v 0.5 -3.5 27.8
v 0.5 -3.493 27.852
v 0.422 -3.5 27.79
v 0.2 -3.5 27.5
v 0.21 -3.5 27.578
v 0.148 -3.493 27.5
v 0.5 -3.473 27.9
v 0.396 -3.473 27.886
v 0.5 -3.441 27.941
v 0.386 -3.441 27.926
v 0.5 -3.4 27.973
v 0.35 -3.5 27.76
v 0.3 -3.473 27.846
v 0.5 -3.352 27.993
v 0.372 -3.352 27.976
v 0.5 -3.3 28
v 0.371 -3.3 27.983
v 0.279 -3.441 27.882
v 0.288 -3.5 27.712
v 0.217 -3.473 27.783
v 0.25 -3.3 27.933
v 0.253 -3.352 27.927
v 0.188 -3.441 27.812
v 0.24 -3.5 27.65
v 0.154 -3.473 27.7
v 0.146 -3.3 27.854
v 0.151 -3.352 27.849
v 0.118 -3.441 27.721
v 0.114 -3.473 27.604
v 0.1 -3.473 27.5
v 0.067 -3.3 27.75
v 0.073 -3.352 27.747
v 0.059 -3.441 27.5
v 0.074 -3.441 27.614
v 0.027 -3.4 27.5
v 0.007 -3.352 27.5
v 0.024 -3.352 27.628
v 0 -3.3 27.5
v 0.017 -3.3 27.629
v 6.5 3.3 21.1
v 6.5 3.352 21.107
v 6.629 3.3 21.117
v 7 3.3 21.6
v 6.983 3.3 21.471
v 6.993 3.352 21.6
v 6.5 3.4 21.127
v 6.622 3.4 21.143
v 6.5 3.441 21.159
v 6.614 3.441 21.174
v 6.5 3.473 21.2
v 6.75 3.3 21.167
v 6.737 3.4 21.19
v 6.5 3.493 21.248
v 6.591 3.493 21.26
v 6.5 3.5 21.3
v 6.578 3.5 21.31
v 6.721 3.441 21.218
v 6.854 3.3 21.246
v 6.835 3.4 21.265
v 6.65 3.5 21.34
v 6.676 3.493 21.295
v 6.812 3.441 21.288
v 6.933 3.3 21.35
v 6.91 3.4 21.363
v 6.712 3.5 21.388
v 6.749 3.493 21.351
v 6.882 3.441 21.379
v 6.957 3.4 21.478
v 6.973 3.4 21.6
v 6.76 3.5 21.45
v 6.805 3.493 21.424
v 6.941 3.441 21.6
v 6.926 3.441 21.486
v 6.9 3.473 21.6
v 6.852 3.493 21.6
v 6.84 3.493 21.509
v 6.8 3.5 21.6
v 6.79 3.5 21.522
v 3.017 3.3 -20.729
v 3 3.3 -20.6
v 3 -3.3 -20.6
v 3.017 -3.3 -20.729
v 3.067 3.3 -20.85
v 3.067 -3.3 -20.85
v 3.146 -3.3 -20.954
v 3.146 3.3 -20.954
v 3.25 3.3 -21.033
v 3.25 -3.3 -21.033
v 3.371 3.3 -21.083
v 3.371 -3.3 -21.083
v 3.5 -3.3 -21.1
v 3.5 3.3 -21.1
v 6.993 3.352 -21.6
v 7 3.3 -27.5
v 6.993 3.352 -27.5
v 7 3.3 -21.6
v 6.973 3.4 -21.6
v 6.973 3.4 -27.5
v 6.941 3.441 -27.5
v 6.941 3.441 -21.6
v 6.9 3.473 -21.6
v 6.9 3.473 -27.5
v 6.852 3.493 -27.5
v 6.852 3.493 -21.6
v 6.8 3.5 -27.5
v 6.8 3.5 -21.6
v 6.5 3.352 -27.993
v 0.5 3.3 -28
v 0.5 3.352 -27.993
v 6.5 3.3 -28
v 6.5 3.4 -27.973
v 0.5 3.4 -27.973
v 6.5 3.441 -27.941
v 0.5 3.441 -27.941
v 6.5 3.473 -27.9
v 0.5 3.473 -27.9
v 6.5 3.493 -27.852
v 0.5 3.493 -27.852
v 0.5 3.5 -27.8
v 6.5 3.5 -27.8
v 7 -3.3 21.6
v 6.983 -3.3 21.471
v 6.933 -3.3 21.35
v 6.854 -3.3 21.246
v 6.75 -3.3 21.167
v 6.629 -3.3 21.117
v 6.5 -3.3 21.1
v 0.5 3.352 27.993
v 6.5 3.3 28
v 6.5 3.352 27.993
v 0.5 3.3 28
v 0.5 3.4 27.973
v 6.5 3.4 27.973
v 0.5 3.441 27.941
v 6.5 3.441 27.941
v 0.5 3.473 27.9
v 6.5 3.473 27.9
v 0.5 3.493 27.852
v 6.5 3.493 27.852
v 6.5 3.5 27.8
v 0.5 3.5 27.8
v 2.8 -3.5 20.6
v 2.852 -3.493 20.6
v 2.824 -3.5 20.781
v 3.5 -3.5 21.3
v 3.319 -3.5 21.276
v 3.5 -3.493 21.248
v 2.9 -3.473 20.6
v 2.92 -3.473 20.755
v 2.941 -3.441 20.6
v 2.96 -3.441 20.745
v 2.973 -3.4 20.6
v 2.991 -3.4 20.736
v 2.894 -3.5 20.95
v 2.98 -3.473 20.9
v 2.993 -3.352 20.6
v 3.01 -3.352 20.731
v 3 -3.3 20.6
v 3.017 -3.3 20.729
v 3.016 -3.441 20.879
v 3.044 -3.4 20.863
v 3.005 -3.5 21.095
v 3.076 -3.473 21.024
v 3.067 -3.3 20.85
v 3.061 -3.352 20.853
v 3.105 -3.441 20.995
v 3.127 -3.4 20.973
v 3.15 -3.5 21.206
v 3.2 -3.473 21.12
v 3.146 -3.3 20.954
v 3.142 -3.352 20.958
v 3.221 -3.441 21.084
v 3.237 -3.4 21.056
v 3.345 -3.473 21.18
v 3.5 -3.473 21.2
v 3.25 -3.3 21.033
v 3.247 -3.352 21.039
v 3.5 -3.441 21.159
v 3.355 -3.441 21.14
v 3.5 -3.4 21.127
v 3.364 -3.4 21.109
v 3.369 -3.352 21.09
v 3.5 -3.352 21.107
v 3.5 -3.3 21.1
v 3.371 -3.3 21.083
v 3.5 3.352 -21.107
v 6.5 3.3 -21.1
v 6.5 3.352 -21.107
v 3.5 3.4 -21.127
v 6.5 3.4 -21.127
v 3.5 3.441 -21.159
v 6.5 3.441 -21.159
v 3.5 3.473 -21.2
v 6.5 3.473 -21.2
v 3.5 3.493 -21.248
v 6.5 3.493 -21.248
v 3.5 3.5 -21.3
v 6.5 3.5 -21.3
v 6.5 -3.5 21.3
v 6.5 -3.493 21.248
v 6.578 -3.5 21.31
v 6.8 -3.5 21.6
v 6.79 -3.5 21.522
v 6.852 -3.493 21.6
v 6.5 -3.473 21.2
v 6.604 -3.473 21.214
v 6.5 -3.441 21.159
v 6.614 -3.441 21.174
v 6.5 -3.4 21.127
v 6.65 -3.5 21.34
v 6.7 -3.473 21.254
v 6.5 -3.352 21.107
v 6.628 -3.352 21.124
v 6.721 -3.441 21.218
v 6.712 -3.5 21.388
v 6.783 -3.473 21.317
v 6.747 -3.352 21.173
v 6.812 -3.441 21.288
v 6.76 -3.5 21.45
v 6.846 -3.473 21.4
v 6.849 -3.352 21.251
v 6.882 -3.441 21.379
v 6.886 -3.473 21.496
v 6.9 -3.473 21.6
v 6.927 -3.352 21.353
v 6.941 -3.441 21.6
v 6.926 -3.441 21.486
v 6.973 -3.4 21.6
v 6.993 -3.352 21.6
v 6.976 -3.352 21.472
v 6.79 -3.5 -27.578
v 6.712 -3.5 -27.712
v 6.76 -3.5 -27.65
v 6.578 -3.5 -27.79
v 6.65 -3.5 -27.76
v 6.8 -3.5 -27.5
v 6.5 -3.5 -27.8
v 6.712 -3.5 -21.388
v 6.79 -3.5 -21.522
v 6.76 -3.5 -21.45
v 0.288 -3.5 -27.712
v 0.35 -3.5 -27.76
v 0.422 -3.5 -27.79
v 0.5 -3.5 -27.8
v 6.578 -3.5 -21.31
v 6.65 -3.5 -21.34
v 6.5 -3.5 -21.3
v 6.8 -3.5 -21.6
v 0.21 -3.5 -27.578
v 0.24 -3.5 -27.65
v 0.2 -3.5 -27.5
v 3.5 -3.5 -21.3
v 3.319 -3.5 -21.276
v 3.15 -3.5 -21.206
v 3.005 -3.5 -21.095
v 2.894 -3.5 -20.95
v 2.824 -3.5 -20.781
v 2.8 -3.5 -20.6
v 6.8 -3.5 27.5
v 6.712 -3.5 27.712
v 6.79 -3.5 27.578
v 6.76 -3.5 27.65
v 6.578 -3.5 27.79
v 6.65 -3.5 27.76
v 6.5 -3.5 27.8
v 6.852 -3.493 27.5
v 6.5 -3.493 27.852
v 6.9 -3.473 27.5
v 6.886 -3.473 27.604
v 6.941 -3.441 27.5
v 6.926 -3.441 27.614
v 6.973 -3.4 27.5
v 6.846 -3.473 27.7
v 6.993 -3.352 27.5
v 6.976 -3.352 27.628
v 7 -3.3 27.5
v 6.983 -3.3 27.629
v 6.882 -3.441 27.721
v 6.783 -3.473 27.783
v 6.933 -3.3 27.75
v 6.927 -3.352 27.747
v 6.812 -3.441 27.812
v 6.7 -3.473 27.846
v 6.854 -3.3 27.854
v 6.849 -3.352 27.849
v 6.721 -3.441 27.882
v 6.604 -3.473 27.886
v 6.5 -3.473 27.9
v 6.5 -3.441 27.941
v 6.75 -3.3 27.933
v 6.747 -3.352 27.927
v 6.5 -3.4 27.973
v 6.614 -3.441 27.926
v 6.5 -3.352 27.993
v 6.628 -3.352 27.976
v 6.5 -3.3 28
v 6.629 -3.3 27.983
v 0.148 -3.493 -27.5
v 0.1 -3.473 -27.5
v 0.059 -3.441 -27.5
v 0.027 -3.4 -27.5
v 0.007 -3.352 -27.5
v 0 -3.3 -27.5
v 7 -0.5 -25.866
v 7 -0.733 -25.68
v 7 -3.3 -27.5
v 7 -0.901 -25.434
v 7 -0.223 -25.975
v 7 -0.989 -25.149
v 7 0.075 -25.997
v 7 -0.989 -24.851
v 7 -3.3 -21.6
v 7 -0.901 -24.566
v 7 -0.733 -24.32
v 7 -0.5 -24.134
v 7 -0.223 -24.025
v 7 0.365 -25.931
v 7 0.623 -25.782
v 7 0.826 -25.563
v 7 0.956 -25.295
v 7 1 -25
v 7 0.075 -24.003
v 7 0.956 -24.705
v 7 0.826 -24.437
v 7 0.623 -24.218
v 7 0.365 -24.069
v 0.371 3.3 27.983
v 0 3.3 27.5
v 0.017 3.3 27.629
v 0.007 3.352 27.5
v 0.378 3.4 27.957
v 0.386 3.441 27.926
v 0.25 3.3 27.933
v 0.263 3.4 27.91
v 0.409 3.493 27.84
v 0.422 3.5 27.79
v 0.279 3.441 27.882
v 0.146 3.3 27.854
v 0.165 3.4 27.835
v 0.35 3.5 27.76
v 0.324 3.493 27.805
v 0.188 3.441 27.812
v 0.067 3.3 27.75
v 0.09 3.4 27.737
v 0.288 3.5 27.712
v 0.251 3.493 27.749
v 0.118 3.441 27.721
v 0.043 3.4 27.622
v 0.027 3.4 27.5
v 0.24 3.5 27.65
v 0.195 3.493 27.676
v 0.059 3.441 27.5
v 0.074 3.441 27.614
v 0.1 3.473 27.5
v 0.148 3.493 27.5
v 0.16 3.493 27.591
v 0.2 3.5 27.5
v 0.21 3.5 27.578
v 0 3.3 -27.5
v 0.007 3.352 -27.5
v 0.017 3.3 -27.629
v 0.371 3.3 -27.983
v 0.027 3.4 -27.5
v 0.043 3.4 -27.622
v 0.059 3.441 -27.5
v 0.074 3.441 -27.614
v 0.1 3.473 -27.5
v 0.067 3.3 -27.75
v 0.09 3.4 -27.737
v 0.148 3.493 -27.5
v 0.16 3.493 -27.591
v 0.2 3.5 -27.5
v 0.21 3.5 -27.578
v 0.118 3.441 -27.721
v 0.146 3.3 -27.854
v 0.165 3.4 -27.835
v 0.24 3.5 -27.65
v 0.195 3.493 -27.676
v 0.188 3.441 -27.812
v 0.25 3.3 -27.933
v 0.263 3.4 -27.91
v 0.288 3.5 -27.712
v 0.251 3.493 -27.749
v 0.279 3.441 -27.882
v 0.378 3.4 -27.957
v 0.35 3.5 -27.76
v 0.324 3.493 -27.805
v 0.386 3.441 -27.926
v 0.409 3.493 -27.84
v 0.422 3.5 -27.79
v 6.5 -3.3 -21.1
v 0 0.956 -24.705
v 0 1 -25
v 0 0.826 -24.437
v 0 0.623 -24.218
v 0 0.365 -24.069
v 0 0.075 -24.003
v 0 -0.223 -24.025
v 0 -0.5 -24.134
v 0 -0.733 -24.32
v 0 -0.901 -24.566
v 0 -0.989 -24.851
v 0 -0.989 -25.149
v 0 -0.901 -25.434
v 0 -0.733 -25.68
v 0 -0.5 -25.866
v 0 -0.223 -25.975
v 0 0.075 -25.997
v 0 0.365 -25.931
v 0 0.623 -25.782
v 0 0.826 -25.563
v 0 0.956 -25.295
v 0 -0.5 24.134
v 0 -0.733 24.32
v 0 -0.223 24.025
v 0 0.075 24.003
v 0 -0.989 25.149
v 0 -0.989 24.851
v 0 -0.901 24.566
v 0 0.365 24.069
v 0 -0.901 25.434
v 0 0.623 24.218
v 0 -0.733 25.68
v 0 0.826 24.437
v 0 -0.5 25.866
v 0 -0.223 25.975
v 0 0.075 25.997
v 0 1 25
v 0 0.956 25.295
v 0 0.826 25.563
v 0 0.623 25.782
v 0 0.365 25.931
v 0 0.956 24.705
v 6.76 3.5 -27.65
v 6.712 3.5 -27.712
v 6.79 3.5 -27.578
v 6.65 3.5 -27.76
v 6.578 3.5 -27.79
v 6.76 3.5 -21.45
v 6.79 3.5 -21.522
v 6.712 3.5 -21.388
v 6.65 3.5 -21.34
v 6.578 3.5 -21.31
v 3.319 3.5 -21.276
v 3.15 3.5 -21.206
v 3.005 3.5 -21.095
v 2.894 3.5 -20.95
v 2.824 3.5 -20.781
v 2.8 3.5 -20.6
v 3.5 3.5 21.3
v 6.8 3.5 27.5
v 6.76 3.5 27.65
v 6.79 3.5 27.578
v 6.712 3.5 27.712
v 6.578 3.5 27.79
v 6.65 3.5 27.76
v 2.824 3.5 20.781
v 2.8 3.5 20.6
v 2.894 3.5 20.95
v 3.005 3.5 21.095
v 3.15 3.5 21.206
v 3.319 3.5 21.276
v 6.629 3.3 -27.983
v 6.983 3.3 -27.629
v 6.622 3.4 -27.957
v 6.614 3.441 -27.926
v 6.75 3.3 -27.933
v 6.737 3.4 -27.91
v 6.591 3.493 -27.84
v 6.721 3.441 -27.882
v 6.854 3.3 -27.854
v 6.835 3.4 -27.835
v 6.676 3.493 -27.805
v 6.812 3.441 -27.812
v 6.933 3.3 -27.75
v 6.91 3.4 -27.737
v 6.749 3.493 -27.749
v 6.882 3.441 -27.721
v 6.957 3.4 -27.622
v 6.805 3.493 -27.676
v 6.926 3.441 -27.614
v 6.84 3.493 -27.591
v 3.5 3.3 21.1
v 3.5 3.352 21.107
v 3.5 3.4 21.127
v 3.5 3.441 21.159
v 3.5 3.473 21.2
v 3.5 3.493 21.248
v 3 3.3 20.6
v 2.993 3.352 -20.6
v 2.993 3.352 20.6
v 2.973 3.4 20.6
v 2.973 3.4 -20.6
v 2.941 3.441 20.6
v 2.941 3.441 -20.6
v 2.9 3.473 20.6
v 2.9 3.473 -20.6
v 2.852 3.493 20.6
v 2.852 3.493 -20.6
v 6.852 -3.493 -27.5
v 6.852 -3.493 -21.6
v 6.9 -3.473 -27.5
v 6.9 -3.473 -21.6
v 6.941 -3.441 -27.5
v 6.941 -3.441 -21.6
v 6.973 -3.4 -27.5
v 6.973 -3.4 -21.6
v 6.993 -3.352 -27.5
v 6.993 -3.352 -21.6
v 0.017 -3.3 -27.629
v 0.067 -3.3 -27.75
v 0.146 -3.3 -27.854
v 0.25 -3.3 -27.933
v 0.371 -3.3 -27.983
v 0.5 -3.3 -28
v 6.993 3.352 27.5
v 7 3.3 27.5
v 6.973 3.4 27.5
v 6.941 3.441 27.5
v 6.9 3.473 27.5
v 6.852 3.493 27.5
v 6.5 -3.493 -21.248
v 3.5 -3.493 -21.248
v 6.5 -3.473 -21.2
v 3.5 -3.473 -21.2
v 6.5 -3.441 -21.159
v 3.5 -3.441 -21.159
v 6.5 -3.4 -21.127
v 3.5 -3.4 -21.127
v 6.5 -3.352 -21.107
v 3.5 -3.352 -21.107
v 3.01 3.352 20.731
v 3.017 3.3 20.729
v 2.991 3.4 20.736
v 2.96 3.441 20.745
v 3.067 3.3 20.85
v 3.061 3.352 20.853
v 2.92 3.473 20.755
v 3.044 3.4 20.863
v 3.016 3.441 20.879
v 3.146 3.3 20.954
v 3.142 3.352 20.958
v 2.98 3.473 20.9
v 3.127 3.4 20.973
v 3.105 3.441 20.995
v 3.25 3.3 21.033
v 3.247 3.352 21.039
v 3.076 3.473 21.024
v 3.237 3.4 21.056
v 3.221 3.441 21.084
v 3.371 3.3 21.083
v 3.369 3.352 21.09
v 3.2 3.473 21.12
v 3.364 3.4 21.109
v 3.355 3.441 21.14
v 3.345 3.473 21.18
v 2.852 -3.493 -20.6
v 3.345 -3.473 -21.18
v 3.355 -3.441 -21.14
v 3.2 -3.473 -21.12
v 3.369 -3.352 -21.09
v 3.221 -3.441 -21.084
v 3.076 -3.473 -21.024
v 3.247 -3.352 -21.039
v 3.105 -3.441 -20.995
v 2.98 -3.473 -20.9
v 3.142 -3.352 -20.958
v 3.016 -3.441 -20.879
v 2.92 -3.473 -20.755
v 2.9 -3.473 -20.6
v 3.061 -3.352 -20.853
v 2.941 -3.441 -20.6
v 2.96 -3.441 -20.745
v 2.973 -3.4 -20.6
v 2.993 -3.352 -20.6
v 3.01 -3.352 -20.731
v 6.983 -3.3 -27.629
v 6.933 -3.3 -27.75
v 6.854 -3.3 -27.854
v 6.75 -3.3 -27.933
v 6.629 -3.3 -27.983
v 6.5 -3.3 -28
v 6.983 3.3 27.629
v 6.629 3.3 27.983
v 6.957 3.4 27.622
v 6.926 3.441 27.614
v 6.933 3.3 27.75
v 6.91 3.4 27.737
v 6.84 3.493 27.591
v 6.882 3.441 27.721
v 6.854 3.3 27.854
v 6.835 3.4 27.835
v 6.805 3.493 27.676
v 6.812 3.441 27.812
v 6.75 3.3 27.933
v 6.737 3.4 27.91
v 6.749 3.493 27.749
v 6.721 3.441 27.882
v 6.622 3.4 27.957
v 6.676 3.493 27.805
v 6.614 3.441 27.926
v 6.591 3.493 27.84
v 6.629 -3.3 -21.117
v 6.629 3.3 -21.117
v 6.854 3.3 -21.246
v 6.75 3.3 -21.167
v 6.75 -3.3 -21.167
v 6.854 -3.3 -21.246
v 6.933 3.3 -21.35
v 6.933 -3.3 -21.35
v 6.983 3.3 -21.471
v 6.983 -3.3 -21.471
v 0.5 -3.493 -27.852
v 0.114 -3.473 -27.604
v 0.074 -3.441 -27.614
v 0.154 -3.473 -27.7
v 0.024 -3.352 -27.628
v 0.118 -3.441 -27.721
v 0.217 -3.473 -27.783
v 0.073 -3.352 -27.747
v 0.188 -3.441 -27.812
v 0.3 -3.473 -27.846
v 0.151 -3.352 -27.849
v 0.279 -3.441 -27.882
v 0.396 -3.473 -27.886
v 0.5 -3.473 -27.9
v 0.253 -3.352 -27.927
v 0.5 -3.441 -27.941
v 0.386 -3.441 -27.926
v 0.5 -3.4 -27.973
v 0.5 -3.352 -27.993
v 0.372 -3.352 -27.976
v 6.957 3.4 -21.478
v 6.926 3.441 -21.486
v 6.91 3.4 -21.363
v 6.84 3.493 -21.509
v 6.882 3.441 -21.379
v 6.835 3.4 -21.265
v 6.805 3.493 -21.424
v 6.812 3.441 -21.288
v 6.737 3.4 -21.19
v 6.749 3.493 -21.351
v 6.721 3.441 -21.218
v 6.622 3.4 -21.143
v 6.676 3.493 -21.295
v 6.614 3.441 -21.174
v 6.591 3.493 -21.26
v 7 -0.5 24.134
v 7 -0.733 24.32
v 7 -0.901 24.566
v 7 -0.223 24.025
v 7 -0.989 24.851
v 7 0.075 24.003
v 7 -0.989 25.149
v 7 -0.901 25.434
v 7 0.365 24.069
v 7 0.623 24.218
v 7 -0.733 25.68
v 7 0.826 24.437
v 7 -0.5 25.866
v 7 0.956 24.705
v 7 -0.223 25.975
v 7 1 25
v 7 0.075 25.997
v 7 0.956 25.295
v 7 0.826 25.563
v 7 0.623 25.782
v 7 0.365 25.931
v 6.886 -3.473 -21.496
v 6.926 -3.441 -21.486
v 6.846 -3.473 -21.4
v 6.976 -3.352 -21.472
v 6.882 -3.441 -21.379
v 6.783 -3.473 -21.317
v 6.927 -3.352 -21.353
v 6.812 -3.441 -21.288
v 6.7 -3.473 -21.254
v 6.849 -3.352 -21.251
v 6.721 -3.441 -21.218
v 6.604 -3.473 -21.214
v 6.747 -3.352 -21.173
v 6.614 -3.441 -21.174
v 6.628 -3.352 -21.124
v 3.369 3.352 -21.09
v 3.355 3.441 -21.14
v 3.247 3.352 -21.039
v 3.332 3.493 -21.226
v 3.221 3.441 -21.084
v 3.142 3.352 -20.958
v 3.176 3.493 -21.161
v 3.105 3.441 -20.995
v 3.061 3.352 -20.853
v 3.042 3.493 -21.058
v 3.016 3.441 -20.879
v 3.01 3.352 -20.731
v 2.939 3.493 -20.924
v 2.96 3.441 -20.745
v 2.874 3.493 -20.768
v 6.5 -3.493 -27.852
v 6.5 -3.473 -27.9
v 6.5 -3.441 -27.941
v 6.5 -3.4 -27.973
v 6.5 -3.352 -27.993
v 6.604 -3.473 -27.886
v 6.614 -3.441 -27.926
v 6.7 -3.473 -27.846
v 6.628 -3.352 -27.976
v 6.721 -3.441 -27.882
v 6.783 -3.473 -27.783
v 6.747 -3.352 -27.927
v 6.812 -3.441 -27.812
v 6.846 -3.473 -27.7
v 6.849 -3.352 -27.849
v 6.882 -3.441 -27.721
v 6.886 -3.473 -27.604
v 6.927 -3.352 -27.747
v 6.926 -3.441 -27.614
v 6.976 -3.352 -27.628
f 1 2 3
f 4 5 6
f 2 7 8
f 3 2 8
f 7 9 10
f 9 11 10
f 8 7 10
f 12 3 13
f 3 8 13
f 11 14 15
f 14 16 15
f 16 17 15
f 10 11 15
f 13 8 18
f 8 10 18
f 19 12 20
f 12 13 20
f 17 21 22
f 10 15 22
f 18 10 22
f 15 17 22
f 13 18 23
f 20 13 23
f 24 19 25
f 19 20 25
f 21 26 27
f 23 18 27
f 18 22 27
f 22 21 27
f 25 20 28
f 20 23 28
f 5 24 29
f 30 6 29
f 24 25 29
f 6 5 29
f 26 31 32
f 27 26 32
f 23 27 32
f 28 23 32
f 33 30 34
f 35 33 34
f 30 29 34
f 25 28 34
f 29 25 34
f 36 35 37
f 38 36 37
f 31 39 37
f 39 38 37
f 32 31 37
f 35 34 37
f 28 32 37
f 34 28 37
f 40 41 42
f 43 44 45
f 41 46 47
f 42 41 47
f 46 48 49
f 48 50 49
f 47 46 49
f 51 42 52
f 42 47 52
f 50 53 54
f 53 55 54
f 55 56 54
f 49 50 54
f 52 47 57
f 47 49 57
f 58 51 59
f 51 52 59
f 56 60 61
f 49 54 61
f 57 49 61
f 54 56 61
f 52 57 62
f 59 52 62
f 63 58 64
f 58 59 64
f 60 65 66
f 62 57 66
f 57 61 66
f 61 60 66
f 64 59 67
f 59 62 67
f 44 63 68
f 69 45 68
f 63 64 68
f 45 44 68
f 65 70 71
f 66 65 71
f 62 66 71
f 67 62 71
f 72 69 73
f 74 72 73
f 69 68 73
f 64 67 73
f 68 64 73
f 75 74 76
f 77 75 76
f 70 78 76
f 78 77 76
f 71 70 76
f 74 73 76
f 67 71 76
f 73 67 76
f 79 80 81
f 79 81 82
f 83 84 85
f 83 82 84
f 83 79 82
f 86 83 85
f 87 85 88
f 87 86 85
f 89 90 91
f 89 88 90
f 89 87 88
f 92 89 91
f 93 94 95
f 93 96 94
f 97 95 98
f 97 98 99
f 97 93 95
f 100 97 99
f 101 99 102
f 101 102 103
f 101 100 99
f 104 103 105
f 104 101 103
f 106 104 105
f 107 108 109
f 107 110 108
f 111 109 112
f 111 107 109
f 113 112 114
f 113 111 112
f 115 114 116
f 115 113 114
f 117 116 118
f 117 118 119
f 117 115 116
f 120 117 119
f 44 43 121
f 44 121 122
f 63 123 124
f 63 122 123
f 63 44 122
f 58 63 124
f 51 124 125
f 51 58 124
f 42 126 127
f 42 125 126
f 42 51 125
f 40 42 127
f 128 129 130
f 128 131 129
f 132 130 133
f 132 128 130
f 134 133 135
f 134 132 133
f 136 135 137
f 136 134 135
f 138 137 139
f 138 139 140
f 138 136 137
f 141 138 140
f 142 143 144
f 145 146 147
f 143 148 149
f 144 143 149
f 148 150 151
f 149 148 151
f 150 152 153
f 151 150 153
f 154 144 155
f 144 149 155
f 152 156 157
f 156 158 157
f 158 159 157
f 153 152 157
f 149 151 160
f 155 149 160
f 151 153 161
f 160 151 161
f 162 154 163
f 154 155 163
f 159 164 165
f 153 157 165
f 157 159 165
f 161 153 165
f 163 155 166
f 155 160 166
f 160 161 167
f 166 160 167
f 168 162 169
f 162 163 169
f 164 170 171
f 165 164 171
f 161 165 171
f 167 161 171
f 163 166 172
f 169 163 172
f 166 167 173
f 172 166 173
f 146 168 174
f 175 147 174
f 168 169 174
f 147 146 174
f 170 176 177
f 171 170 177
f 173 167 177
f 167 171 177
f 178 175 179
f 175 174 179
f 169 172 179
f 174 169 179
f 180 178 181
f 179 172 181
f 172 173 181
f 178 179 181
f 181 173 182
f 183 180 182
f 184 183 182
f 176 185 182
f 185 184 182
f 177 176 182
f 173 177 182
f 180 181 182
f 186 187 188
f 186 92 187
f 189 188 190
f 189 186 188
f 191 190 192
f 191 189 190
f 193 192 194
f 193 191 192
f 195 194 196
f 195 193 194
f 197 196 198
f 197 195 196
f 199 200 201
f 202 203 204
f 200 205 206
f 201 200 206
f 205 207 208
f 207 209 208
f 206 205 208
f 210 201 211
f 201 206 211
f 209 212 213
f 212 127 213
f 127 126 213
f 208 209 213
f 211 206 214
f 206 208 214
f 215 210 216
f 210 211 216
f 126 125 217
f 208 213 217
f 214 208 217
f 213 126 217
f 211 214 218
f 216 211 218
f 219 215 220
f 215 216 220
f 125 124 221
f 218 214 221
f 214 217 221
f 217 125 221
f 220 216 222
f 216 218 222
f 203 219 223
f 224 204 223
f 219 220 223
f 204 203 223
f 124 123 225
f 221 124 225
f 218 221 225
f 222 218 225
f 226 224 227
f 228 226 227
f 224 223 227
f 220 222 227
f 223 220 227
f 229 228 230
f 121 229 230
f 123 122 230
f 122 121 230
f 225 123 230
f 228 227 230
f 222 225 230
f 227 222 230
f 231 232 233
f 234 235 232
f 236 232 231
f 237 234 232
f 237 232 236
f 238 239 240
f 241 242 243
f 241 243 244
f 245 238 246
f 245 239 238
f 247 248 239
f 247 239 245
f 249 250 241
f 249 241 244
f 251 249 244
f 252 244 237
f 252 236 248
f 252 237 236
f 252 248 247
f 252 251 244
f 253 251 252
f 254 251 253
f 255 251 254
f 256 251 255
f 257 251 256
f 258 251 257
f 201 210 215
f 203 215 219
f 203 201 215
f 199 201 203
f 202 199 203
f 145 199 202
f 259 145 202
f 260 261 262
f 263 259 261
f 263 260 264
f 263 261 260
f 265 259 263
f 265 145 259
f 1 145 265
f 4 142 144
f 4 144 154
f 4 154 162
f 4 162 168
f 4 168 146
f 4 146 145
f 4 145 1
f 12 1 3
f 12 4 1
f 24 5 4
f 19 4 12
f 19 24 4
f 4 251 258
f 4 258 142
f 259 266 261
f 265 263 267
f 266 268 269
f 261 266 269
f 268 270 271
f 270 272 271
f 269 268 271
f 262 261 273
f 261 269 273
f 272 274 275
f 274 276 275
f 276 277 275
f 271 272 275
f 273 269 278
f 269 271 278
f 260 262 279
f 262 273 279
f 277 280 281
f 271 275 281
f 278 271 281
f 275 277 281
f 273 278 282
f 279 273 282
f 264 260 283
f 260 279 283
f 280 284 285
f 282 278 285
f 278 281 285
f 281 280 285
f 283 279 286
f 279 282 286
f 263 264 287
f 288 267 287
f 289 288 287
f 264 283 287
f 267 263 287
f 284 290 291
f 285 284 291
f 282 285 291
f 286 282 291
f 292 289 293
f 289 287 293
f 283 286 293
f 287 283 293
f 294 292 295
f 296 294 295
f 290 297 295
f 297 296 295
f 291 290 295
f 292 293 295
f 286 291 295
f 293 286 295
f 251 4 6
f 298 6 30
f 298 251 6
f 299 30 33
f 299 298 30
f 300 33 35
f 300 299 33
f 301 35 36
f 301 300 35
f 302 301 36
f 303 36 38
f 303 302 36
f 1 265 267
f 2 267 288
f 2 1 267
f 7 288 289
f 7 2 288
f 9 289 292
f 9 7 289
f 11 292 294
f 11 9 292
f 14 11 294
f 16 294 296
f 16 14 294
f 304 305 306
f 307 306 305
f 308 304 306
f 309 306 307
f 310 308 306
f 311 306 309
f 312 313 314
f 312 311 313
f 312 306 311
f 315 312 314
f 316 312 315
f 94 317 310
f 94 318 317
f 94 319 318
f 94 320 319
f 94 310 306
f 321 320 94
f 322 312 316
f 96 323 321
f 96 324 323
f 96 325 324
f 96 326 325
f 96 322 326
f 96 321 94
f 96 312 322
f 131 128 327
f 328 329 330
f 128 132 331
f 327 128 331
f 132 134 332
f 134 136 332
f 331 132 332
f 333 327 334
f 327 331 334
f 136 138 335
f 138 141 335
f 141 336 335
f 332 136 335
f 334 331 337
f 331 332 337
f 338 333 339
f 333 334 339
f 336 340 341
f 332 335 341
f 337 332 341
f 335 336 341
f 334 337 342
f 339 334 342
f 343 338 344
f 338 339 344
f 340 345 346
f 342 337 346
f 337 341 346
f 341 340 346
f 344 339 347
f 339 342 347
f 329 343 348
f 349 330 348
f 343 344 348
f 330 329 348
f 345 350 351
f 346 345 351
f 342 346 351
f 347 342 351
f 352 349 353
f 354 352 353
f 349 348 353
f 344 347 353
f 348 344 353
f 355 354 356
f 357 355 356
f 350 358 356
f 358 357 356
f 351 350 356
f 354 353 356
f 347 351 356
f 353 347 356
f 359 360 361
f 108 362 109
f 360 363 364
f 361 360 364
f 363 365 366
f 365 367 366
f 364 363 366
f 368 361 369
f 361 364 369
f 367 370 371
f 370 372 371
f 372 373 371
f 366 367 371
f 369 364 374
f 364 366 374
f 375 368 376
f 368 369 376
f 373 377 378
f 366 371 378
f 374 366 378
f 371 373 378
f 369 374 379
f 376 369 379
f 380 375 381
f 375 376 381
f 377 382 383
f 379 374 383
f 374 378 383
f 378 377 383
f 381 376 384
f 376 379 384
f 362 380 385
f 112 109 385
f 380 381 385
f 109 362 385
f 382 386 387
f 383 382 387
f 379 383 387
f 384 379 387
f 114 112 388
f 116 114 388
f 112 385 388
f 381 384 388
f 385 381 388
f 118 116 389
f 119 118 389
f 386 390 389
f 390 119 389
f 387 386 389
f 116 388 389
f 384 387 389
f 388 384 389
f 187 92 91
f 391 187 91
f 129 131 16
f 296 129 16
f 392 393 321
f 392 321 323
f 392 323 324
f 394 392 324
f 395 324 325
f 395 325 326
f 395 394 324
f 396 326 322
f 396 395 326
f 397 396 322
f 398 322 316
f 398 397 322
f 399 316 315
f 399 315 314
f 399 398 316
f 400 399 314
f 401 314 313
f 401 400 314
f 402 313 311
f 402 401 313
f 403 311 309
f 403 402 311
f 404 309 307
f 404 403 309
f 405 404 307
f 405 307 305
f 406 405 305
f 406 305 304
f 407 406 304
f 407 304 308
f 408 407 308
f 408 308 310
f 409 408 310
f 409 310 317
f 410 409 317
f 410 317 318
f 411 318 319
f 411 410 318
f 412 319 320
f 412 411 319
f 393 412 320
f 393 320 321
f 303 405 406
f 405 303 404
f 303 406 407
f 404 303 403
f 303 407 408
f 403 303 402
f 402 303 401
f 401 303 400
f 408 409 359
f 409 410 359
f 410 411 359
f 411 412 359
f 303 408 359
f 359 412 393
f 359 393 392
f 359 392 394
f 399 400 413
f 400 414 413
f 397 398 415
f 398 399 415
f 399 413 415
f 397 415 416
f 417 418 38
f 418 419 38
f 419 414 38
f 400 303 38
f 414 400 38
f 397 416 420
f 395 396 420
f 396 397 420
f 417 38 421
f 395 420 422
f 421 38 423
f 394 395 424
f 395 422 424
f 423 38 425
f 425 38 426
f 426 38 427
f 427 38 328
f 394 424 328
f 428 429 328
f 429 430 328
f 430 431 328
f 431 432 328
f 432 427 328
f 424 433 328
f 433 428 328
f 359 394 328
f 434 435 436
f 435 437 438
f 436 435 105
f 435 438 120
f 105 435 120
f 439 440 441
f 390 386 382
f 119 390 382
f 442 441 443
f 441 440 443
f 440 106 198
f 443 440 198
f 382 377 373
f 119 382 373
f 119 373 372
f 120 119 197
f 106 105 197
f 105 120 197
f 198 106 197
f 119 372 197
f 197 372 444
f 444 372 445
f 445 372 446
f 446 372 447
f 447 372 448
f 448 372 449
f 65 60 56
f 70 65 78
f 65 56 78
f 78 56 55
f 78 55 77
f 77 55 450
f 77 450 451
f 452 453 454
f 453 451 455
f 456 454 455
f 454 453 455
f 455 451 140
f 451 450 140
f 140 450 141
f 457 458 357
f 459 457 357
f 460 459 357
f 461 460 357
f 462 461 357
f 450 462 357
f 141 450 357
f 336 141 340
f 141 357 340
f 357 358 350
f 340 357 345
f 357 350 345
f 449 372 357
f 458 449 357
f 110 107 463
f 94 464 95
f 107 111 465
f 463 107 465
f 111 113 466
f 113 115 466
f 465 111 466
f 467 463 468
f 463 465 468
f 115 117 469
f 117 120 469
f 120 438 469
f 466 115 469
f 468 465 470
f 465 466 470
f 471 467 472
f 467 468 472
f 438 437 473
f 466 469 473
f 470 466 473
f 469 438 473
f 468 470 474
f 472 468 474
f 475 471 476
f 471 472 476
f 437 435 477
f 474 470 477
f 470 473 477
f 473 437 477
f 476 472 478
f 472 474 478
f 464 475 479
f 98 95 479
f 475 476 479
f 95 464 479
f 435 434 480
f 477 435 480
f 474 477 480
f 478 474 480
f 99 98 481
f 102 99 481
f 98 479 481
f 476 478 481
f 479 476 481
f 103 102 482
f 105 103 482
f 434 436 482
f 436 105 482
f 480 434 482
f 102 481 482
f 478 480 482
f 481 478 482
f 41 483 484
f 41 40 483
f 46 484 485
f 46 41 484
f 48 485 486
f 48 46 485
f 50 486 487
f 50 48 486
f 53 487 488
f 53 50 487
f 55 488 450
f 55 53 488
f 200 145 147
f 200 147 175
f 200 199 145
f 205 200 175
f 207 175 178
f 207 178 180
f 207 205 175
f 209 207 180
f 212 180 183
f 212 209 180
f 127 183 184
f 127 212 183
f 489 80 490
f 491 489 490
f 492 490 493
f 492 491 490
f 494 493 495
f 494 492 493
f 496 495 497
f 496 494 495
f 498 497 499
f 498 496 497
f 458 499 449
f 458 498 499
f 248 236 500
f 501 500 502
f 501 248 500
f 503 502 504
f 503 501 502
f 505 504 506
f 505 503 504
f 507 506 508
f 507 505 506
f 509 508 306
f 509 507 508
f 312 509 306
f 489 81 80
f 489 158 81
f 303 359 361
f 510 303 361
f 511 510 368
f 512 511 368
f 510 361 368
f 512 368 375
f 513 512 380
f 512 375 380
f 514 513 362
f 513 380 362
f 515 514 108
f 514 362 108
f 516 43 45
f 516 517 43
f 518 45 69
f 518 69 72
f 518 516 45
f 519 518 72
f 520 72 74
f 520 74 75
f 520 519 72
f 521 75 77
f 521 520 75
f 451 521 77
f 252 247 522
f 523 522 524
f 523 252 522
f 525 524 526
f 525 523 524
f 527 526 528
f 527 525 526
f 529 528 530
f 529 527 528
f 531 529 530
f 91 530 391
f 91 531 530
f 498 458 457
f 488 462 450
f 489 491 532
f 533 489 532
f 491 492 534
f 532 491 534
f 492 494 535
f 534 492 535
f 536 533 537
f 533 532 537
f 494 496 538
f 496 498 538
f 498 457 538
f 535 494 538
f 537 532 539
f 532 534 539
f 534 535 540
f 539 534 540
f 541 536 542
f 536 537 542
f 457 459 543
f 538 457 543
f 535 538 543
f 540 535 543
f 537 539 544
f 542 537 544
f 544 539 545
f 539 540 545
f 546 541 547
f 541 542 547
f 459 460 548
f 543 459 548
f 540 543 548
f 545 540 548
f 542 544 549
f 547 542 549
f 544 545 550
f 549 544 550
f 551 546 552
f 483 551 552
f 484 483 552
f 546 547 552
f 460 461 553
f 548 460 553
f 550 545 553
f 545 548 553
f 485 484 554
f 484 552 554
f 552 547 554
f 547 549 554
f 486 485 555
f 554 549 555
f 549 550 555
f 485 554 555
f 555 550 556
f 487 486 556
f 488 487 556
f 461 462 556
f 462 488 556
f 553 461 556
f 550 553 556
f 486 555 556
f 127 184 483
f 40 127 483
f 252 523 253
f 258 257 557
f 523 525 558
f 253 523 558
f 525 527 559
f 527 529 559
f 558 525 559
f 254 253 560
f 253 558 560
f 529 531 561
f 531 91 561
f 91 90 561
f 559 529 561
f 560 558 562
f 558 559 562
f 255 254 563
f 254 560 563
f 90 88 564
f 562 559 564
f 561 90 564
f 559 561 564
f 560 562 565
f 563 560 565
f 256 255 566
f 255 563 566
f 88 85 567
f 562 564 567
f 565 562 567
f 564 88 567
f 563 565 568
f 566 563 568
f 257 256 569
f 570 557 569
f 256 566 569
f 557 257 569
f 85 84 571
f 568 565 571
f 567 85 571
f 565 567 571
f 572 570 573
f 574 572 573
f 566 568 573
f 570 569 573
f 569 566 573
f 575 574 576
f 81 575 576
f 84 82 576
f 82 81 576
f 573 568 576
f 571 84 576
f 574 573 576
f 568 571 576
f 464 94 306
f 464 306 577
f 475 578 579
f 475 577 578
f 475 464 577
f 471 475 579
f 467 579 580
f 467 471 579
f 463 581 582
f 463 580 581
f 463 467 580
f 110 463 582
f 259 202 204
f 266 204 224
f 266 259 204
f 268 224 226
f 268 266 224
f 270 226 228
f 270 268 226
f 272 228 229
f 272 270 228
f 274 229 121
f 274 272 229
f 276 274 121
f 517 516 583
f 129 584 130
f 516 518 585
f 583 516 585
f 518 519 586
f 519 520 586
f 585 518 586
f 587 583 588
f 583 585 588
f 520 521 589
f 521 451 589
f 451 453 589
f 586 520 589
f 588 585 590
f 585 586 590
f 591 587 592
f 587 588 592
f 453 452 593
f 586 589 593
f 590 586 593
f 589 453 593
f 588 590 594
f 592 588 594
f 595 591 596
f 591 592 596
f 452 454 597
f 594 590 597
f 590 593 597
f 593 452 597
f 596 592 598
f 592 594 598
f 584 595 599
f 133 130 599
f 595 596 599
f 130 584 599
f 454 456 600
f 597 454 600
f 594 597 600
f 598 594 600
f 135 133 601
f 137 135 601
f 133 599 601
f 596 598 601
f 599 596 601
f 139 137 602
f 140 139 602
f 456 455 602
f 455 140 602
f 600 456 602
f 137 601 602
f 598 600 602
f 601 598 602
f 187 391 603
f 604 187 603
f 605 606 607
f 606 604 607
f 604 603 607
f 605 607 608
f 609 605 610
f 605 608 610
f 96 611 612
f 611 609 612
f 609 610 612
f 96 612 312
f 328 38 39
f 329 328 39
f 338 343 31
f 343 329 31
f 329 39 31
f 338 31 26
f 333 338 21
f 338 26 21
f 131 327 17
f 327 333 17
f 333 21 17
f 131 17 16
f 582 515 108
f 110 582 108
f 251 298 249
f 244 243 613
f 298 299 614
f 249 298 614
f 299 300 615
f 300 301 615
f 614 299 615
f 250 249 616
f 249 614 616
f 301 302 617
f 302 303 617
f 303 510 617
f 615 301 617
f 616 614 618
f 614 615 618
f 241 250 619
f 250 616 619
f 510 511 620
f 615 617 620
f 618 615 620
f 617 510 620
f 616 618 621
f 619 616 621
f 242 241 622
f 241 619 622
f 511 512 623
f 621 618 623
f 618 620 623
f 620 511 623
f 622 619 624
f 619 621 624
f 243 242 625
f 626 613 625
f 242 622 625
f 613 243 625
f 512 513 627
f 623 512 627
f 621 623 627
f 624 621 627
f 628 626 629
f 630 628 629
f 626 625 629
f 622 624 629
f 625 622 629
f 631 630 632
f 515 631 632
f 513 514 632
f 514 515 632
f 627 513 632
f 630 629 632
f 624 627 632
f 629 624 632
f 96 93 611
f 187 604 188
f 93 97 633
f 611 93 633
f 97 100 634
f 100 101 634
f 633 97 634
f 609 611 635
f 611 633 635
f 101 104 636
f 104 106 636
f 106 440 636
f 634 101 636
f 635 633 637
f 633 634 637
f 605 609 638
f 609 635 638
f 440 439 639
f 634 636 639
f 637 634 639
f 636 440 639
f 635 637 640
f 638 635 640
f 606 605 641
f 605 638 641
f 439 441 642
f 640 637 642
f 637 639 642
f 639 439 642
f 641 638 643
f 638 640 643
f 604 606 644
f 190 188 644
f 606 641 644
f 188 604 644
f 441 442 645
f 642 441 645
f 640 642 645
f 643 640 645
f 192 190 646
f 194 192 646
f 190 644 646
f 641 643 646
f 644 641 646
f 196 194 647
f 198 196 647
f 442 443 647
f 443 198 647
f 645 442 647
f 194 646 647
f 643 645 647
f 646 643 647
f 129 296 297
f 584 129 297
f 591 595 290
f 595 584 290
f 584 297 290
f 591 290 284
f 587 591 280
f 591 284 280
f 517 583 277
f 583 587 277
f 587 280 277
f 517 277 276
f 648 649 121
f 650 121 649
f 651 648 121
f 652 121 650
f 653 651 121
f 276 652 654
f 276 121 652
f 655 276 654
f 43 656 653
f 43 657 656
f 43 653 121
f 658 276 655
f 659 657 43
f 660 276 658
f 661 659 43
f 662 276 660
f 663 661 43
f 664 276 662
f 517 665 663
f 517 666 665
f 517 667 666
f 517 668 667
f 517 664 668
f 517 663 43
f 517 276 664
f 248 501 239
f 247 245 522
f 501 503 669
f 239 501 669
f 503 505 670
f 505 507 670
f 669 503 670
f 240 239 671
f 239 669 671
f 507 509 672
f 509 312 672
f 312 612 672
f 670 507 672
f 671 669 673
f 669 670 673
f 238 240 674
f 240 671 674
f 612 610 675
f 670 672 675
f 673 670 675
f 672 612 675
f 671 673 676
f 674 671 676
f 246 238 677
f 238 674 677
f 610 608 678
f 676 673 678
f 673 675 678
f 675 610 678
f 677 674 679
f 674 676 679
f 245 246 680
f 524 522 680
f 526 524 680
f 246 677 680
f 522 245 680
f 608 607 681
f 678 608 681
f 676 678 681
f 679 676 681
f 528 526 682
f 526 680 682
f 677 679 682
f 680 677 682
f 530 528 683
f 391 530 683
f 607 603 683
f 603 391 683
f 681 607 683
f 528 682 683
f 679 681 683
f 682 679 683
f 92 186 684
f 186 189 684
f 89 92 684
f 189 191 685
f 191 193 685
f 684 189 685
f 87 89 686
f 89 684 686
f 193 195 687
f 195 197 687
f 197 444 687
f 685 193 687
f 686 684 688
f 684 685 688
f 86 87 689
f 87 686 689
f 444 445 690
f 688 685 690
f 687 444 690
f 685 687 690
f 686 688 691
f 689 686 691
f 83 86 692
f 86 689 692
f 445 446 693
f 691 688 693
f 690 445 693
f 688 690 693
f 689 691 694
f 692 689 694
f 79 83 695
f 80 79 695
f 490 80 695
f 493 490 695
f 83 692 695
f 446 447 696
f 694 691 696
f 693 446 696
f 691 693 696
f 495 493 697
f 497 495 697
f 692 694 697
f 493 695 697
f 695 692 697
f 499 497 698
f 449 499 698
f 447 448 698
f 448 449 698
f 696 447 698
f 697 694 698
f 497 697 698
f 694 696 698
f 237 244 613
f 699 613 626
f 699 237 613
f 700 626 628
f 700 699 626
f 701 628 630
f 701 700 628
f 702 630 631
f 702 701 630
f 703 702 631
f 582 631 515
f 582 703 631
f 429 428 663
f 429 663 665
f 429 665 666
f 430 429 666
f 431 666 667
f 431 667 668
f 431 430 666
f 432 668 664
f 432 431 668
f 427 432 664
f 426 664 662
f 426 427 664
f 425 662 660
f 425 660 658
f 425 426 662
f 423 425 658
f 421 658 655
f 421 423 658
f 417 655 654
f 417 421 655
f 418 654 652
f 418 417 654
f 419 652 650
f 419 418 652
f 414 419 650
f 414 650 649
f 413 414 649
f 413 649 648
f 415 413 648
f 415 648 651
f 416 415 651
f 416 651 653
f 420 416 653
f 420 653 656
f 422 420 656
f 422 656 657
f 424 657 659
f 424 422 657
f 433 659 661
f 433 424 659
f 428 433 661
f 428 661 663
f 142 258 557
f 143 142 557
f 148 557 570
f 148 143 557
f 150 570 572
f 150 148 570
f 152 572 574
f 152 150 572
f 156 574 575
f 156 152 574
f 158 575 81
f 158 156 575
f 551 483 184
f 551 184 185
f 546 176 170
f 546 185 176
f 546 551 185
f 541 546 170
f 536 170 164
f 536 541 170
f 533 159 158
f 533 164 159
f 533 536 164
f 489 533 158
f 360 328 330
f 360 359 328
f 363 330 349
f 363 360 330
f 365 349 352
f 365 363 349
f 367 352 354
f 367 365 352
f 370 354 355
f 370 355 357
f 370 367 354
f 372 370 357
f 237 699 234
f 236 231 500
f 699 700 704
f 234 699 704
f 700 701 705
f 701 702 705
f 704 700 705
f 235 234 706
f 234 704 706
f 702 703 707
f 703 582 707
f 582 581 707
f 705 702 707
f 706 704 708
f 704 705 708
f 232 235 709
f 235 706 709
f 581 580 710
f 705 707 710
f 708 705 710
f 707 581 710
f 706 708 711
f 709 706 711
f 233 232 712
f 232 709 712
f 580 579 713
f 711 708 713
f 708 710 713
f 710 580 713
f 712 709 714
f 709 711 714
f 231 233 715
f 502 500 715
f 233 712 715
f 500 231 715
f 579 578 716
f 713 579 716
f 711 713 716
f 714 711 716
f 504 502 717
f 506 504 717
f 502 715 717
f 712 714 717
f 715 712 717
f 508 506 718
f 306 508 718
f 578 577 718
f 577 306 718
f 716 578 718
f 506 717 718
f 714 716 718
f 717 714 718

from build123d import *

# Parameters (mm, degrees)
F0_R     = 1
F1_DEPTH = 7
F0_W     = 7
F0_H     = 42.2
F2_DEPTH = 3
F3_R     = 0.5
F4_R     = 0.2


with BuildPart() as f1:
    # F0 (on Right) → F1 (new body)
    with BuildSketch(Plane.YZ):
        Polygon((3.5, -22.5), (3.5, -21.1), (-3.5, -21.1), (-3.5, -22.5), (-3.5, -28), (3.5, -28), align=None)
        with Locations((0, -25)):
            Circle(F0_R, mode=Mode.SUBTRACT)
    extrude(amount=F1_DEPTH)



with BuildPart() as f1b:
    # F0 (on Right) → F1, piece 2 (new body)
    with BuildSketch(Plane.YZ):
        Polygon((3.5, 22.5), (3.5, 28), (-3.5, 28), (-3.5, 22.5), (-3.5, 21.1), (3.5, 21.1), align=None)
        with Locations((0, 25)):
            Circle(F0_R, mode=Mode.SUBTRACT)
    extrude(amount=F1_DEPTH)


with BuildPart() as f1_1:
    add(f1.part)

    add(f1b.part)  # F2 merges F1b
    # F0 (on Right) → F2 (join)
    with BuildSketch(Plane.YZ):
        Rectangle(F0_W, F0_H)
    extrude(amount=F2_DEPTH)

    # F3
    f3_edges = [f1_1.edges().sort_by_distance(p)[0] for p in [
        (7, 0, -21.1),
        (7, 0, -28),
        (7, 0, 21.1),
        (7, 0, 28),
        (0, 0, 28),
        (0, 0, -28),
        (3, 0, 21.1),
        (3, 0, -21.1),
    ]]
    fillet(f3_edges, radius=F3_R)

    # F4
    f4_edges = [f1_1.edges().sort_by_distance(p)[0] for p in [
        (3, 3.5, 0),
        (3, -3.5, 0),
        (3.5, 3.5, 28),
        (0.146447, 3.5, 27.853553),
        (6.853553, 3.5, 27.853553),
        (0, 3.5, 0),
        (7, 3.5, 24.55),
        (0.146447, 3.5, -27.853553),
        (6.853553, 3.5, 21.246447),
        (3.5, 3.5, -28),
        (5, 3.5, 21.1),
        (6.853553, 3.5, -27.853553),
        (3.146447, 3.5, 20.953553),
        (7, 3.5, -24.55),
        (6.853553, 3.5, -21.246447),
        (3.146447, 3.5, -20.953553),
        (5, 3.5, -21.1),
        (3.5, -3.5, 28),
        (0.146447, -3.5, 27.853553),
        (6.853553, -3.5, 27.853553),
        (0, -3.5, 0),
        (7, -3.5, 24.55),
        (0.146447, -3.5, -27.853553),
        (6.853553, -3.5, 21.246447),
        (3.5, -3.5, -28),
        (5, -3.5, 21.1),
        (6.853553, -3.5, -27.853553),
        (3.146447, -3.5, 20.953553),
        (7, -3.5, -24.55),
        (6.853553, -3.5, -21.246447),
        (3.146447, -3.5, -20.953553),
        (5, -3.5, -21.1),
    ]]
    fillet(f4_edges, radius=F4_R)


solid = f1_1.part
